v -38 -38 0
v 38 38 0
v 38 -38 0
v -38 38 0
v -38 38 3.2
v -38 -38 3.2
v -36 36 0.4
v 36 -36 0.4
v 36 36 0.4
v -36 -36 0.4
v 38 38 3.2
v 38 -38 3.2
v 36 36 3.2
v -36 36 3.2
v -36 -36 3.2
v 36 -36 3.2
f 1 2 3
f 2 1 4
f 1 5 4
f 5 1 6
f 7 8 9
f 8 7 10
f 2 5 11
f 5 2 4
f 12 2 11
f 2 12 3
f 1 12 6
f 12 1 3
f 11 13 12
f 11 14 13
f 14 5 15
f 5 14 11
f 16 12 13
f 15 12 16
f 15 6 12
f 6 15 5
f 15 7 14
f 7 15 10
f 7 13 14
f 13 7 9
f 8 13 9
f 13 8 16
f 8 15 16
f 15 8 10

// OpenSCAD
// preview[view:south, tilt:top]

/* [Image] */

// Simple photos with many shades of light/dark areas work best. Don't forget to click the Invert Colors checkbox!
image_file = "/Users/gustavo/Downloads/lithoplane.dat"; // [image_surface:72x72]
original_size = 512;

/* [Hidden] */

// What layer height will you slice this at?  The thinner the better.
layer_height = 0.2;

// base (white) will always be 2 layers thick
min_layer_height = layer_height*2;
height = 3.2 - min_layer_height;

lithopane(72, 72, 1, 1);

module lithopane(length, width, x_scale, y_scale) {
  union() {
    translate([0, 0, min_layer_height]) 
      mirror([1, 0, 0]) 
      mirror([0, 1, 0]) 
      scale([length/original_size,width/original_size,height/256]) 
      surface(file=image_file, center=true, convexity=5);
    
    linear_extrude(height=min_layer_height) 
      square([length+4, width+4], center=true);

    linear_extrude(height=height+min_layer_height) {
  	  difference() {
          square([length+4, width+4], center=true);
          square([length, width], center=true);
  	  }
    }
    
  }
}
